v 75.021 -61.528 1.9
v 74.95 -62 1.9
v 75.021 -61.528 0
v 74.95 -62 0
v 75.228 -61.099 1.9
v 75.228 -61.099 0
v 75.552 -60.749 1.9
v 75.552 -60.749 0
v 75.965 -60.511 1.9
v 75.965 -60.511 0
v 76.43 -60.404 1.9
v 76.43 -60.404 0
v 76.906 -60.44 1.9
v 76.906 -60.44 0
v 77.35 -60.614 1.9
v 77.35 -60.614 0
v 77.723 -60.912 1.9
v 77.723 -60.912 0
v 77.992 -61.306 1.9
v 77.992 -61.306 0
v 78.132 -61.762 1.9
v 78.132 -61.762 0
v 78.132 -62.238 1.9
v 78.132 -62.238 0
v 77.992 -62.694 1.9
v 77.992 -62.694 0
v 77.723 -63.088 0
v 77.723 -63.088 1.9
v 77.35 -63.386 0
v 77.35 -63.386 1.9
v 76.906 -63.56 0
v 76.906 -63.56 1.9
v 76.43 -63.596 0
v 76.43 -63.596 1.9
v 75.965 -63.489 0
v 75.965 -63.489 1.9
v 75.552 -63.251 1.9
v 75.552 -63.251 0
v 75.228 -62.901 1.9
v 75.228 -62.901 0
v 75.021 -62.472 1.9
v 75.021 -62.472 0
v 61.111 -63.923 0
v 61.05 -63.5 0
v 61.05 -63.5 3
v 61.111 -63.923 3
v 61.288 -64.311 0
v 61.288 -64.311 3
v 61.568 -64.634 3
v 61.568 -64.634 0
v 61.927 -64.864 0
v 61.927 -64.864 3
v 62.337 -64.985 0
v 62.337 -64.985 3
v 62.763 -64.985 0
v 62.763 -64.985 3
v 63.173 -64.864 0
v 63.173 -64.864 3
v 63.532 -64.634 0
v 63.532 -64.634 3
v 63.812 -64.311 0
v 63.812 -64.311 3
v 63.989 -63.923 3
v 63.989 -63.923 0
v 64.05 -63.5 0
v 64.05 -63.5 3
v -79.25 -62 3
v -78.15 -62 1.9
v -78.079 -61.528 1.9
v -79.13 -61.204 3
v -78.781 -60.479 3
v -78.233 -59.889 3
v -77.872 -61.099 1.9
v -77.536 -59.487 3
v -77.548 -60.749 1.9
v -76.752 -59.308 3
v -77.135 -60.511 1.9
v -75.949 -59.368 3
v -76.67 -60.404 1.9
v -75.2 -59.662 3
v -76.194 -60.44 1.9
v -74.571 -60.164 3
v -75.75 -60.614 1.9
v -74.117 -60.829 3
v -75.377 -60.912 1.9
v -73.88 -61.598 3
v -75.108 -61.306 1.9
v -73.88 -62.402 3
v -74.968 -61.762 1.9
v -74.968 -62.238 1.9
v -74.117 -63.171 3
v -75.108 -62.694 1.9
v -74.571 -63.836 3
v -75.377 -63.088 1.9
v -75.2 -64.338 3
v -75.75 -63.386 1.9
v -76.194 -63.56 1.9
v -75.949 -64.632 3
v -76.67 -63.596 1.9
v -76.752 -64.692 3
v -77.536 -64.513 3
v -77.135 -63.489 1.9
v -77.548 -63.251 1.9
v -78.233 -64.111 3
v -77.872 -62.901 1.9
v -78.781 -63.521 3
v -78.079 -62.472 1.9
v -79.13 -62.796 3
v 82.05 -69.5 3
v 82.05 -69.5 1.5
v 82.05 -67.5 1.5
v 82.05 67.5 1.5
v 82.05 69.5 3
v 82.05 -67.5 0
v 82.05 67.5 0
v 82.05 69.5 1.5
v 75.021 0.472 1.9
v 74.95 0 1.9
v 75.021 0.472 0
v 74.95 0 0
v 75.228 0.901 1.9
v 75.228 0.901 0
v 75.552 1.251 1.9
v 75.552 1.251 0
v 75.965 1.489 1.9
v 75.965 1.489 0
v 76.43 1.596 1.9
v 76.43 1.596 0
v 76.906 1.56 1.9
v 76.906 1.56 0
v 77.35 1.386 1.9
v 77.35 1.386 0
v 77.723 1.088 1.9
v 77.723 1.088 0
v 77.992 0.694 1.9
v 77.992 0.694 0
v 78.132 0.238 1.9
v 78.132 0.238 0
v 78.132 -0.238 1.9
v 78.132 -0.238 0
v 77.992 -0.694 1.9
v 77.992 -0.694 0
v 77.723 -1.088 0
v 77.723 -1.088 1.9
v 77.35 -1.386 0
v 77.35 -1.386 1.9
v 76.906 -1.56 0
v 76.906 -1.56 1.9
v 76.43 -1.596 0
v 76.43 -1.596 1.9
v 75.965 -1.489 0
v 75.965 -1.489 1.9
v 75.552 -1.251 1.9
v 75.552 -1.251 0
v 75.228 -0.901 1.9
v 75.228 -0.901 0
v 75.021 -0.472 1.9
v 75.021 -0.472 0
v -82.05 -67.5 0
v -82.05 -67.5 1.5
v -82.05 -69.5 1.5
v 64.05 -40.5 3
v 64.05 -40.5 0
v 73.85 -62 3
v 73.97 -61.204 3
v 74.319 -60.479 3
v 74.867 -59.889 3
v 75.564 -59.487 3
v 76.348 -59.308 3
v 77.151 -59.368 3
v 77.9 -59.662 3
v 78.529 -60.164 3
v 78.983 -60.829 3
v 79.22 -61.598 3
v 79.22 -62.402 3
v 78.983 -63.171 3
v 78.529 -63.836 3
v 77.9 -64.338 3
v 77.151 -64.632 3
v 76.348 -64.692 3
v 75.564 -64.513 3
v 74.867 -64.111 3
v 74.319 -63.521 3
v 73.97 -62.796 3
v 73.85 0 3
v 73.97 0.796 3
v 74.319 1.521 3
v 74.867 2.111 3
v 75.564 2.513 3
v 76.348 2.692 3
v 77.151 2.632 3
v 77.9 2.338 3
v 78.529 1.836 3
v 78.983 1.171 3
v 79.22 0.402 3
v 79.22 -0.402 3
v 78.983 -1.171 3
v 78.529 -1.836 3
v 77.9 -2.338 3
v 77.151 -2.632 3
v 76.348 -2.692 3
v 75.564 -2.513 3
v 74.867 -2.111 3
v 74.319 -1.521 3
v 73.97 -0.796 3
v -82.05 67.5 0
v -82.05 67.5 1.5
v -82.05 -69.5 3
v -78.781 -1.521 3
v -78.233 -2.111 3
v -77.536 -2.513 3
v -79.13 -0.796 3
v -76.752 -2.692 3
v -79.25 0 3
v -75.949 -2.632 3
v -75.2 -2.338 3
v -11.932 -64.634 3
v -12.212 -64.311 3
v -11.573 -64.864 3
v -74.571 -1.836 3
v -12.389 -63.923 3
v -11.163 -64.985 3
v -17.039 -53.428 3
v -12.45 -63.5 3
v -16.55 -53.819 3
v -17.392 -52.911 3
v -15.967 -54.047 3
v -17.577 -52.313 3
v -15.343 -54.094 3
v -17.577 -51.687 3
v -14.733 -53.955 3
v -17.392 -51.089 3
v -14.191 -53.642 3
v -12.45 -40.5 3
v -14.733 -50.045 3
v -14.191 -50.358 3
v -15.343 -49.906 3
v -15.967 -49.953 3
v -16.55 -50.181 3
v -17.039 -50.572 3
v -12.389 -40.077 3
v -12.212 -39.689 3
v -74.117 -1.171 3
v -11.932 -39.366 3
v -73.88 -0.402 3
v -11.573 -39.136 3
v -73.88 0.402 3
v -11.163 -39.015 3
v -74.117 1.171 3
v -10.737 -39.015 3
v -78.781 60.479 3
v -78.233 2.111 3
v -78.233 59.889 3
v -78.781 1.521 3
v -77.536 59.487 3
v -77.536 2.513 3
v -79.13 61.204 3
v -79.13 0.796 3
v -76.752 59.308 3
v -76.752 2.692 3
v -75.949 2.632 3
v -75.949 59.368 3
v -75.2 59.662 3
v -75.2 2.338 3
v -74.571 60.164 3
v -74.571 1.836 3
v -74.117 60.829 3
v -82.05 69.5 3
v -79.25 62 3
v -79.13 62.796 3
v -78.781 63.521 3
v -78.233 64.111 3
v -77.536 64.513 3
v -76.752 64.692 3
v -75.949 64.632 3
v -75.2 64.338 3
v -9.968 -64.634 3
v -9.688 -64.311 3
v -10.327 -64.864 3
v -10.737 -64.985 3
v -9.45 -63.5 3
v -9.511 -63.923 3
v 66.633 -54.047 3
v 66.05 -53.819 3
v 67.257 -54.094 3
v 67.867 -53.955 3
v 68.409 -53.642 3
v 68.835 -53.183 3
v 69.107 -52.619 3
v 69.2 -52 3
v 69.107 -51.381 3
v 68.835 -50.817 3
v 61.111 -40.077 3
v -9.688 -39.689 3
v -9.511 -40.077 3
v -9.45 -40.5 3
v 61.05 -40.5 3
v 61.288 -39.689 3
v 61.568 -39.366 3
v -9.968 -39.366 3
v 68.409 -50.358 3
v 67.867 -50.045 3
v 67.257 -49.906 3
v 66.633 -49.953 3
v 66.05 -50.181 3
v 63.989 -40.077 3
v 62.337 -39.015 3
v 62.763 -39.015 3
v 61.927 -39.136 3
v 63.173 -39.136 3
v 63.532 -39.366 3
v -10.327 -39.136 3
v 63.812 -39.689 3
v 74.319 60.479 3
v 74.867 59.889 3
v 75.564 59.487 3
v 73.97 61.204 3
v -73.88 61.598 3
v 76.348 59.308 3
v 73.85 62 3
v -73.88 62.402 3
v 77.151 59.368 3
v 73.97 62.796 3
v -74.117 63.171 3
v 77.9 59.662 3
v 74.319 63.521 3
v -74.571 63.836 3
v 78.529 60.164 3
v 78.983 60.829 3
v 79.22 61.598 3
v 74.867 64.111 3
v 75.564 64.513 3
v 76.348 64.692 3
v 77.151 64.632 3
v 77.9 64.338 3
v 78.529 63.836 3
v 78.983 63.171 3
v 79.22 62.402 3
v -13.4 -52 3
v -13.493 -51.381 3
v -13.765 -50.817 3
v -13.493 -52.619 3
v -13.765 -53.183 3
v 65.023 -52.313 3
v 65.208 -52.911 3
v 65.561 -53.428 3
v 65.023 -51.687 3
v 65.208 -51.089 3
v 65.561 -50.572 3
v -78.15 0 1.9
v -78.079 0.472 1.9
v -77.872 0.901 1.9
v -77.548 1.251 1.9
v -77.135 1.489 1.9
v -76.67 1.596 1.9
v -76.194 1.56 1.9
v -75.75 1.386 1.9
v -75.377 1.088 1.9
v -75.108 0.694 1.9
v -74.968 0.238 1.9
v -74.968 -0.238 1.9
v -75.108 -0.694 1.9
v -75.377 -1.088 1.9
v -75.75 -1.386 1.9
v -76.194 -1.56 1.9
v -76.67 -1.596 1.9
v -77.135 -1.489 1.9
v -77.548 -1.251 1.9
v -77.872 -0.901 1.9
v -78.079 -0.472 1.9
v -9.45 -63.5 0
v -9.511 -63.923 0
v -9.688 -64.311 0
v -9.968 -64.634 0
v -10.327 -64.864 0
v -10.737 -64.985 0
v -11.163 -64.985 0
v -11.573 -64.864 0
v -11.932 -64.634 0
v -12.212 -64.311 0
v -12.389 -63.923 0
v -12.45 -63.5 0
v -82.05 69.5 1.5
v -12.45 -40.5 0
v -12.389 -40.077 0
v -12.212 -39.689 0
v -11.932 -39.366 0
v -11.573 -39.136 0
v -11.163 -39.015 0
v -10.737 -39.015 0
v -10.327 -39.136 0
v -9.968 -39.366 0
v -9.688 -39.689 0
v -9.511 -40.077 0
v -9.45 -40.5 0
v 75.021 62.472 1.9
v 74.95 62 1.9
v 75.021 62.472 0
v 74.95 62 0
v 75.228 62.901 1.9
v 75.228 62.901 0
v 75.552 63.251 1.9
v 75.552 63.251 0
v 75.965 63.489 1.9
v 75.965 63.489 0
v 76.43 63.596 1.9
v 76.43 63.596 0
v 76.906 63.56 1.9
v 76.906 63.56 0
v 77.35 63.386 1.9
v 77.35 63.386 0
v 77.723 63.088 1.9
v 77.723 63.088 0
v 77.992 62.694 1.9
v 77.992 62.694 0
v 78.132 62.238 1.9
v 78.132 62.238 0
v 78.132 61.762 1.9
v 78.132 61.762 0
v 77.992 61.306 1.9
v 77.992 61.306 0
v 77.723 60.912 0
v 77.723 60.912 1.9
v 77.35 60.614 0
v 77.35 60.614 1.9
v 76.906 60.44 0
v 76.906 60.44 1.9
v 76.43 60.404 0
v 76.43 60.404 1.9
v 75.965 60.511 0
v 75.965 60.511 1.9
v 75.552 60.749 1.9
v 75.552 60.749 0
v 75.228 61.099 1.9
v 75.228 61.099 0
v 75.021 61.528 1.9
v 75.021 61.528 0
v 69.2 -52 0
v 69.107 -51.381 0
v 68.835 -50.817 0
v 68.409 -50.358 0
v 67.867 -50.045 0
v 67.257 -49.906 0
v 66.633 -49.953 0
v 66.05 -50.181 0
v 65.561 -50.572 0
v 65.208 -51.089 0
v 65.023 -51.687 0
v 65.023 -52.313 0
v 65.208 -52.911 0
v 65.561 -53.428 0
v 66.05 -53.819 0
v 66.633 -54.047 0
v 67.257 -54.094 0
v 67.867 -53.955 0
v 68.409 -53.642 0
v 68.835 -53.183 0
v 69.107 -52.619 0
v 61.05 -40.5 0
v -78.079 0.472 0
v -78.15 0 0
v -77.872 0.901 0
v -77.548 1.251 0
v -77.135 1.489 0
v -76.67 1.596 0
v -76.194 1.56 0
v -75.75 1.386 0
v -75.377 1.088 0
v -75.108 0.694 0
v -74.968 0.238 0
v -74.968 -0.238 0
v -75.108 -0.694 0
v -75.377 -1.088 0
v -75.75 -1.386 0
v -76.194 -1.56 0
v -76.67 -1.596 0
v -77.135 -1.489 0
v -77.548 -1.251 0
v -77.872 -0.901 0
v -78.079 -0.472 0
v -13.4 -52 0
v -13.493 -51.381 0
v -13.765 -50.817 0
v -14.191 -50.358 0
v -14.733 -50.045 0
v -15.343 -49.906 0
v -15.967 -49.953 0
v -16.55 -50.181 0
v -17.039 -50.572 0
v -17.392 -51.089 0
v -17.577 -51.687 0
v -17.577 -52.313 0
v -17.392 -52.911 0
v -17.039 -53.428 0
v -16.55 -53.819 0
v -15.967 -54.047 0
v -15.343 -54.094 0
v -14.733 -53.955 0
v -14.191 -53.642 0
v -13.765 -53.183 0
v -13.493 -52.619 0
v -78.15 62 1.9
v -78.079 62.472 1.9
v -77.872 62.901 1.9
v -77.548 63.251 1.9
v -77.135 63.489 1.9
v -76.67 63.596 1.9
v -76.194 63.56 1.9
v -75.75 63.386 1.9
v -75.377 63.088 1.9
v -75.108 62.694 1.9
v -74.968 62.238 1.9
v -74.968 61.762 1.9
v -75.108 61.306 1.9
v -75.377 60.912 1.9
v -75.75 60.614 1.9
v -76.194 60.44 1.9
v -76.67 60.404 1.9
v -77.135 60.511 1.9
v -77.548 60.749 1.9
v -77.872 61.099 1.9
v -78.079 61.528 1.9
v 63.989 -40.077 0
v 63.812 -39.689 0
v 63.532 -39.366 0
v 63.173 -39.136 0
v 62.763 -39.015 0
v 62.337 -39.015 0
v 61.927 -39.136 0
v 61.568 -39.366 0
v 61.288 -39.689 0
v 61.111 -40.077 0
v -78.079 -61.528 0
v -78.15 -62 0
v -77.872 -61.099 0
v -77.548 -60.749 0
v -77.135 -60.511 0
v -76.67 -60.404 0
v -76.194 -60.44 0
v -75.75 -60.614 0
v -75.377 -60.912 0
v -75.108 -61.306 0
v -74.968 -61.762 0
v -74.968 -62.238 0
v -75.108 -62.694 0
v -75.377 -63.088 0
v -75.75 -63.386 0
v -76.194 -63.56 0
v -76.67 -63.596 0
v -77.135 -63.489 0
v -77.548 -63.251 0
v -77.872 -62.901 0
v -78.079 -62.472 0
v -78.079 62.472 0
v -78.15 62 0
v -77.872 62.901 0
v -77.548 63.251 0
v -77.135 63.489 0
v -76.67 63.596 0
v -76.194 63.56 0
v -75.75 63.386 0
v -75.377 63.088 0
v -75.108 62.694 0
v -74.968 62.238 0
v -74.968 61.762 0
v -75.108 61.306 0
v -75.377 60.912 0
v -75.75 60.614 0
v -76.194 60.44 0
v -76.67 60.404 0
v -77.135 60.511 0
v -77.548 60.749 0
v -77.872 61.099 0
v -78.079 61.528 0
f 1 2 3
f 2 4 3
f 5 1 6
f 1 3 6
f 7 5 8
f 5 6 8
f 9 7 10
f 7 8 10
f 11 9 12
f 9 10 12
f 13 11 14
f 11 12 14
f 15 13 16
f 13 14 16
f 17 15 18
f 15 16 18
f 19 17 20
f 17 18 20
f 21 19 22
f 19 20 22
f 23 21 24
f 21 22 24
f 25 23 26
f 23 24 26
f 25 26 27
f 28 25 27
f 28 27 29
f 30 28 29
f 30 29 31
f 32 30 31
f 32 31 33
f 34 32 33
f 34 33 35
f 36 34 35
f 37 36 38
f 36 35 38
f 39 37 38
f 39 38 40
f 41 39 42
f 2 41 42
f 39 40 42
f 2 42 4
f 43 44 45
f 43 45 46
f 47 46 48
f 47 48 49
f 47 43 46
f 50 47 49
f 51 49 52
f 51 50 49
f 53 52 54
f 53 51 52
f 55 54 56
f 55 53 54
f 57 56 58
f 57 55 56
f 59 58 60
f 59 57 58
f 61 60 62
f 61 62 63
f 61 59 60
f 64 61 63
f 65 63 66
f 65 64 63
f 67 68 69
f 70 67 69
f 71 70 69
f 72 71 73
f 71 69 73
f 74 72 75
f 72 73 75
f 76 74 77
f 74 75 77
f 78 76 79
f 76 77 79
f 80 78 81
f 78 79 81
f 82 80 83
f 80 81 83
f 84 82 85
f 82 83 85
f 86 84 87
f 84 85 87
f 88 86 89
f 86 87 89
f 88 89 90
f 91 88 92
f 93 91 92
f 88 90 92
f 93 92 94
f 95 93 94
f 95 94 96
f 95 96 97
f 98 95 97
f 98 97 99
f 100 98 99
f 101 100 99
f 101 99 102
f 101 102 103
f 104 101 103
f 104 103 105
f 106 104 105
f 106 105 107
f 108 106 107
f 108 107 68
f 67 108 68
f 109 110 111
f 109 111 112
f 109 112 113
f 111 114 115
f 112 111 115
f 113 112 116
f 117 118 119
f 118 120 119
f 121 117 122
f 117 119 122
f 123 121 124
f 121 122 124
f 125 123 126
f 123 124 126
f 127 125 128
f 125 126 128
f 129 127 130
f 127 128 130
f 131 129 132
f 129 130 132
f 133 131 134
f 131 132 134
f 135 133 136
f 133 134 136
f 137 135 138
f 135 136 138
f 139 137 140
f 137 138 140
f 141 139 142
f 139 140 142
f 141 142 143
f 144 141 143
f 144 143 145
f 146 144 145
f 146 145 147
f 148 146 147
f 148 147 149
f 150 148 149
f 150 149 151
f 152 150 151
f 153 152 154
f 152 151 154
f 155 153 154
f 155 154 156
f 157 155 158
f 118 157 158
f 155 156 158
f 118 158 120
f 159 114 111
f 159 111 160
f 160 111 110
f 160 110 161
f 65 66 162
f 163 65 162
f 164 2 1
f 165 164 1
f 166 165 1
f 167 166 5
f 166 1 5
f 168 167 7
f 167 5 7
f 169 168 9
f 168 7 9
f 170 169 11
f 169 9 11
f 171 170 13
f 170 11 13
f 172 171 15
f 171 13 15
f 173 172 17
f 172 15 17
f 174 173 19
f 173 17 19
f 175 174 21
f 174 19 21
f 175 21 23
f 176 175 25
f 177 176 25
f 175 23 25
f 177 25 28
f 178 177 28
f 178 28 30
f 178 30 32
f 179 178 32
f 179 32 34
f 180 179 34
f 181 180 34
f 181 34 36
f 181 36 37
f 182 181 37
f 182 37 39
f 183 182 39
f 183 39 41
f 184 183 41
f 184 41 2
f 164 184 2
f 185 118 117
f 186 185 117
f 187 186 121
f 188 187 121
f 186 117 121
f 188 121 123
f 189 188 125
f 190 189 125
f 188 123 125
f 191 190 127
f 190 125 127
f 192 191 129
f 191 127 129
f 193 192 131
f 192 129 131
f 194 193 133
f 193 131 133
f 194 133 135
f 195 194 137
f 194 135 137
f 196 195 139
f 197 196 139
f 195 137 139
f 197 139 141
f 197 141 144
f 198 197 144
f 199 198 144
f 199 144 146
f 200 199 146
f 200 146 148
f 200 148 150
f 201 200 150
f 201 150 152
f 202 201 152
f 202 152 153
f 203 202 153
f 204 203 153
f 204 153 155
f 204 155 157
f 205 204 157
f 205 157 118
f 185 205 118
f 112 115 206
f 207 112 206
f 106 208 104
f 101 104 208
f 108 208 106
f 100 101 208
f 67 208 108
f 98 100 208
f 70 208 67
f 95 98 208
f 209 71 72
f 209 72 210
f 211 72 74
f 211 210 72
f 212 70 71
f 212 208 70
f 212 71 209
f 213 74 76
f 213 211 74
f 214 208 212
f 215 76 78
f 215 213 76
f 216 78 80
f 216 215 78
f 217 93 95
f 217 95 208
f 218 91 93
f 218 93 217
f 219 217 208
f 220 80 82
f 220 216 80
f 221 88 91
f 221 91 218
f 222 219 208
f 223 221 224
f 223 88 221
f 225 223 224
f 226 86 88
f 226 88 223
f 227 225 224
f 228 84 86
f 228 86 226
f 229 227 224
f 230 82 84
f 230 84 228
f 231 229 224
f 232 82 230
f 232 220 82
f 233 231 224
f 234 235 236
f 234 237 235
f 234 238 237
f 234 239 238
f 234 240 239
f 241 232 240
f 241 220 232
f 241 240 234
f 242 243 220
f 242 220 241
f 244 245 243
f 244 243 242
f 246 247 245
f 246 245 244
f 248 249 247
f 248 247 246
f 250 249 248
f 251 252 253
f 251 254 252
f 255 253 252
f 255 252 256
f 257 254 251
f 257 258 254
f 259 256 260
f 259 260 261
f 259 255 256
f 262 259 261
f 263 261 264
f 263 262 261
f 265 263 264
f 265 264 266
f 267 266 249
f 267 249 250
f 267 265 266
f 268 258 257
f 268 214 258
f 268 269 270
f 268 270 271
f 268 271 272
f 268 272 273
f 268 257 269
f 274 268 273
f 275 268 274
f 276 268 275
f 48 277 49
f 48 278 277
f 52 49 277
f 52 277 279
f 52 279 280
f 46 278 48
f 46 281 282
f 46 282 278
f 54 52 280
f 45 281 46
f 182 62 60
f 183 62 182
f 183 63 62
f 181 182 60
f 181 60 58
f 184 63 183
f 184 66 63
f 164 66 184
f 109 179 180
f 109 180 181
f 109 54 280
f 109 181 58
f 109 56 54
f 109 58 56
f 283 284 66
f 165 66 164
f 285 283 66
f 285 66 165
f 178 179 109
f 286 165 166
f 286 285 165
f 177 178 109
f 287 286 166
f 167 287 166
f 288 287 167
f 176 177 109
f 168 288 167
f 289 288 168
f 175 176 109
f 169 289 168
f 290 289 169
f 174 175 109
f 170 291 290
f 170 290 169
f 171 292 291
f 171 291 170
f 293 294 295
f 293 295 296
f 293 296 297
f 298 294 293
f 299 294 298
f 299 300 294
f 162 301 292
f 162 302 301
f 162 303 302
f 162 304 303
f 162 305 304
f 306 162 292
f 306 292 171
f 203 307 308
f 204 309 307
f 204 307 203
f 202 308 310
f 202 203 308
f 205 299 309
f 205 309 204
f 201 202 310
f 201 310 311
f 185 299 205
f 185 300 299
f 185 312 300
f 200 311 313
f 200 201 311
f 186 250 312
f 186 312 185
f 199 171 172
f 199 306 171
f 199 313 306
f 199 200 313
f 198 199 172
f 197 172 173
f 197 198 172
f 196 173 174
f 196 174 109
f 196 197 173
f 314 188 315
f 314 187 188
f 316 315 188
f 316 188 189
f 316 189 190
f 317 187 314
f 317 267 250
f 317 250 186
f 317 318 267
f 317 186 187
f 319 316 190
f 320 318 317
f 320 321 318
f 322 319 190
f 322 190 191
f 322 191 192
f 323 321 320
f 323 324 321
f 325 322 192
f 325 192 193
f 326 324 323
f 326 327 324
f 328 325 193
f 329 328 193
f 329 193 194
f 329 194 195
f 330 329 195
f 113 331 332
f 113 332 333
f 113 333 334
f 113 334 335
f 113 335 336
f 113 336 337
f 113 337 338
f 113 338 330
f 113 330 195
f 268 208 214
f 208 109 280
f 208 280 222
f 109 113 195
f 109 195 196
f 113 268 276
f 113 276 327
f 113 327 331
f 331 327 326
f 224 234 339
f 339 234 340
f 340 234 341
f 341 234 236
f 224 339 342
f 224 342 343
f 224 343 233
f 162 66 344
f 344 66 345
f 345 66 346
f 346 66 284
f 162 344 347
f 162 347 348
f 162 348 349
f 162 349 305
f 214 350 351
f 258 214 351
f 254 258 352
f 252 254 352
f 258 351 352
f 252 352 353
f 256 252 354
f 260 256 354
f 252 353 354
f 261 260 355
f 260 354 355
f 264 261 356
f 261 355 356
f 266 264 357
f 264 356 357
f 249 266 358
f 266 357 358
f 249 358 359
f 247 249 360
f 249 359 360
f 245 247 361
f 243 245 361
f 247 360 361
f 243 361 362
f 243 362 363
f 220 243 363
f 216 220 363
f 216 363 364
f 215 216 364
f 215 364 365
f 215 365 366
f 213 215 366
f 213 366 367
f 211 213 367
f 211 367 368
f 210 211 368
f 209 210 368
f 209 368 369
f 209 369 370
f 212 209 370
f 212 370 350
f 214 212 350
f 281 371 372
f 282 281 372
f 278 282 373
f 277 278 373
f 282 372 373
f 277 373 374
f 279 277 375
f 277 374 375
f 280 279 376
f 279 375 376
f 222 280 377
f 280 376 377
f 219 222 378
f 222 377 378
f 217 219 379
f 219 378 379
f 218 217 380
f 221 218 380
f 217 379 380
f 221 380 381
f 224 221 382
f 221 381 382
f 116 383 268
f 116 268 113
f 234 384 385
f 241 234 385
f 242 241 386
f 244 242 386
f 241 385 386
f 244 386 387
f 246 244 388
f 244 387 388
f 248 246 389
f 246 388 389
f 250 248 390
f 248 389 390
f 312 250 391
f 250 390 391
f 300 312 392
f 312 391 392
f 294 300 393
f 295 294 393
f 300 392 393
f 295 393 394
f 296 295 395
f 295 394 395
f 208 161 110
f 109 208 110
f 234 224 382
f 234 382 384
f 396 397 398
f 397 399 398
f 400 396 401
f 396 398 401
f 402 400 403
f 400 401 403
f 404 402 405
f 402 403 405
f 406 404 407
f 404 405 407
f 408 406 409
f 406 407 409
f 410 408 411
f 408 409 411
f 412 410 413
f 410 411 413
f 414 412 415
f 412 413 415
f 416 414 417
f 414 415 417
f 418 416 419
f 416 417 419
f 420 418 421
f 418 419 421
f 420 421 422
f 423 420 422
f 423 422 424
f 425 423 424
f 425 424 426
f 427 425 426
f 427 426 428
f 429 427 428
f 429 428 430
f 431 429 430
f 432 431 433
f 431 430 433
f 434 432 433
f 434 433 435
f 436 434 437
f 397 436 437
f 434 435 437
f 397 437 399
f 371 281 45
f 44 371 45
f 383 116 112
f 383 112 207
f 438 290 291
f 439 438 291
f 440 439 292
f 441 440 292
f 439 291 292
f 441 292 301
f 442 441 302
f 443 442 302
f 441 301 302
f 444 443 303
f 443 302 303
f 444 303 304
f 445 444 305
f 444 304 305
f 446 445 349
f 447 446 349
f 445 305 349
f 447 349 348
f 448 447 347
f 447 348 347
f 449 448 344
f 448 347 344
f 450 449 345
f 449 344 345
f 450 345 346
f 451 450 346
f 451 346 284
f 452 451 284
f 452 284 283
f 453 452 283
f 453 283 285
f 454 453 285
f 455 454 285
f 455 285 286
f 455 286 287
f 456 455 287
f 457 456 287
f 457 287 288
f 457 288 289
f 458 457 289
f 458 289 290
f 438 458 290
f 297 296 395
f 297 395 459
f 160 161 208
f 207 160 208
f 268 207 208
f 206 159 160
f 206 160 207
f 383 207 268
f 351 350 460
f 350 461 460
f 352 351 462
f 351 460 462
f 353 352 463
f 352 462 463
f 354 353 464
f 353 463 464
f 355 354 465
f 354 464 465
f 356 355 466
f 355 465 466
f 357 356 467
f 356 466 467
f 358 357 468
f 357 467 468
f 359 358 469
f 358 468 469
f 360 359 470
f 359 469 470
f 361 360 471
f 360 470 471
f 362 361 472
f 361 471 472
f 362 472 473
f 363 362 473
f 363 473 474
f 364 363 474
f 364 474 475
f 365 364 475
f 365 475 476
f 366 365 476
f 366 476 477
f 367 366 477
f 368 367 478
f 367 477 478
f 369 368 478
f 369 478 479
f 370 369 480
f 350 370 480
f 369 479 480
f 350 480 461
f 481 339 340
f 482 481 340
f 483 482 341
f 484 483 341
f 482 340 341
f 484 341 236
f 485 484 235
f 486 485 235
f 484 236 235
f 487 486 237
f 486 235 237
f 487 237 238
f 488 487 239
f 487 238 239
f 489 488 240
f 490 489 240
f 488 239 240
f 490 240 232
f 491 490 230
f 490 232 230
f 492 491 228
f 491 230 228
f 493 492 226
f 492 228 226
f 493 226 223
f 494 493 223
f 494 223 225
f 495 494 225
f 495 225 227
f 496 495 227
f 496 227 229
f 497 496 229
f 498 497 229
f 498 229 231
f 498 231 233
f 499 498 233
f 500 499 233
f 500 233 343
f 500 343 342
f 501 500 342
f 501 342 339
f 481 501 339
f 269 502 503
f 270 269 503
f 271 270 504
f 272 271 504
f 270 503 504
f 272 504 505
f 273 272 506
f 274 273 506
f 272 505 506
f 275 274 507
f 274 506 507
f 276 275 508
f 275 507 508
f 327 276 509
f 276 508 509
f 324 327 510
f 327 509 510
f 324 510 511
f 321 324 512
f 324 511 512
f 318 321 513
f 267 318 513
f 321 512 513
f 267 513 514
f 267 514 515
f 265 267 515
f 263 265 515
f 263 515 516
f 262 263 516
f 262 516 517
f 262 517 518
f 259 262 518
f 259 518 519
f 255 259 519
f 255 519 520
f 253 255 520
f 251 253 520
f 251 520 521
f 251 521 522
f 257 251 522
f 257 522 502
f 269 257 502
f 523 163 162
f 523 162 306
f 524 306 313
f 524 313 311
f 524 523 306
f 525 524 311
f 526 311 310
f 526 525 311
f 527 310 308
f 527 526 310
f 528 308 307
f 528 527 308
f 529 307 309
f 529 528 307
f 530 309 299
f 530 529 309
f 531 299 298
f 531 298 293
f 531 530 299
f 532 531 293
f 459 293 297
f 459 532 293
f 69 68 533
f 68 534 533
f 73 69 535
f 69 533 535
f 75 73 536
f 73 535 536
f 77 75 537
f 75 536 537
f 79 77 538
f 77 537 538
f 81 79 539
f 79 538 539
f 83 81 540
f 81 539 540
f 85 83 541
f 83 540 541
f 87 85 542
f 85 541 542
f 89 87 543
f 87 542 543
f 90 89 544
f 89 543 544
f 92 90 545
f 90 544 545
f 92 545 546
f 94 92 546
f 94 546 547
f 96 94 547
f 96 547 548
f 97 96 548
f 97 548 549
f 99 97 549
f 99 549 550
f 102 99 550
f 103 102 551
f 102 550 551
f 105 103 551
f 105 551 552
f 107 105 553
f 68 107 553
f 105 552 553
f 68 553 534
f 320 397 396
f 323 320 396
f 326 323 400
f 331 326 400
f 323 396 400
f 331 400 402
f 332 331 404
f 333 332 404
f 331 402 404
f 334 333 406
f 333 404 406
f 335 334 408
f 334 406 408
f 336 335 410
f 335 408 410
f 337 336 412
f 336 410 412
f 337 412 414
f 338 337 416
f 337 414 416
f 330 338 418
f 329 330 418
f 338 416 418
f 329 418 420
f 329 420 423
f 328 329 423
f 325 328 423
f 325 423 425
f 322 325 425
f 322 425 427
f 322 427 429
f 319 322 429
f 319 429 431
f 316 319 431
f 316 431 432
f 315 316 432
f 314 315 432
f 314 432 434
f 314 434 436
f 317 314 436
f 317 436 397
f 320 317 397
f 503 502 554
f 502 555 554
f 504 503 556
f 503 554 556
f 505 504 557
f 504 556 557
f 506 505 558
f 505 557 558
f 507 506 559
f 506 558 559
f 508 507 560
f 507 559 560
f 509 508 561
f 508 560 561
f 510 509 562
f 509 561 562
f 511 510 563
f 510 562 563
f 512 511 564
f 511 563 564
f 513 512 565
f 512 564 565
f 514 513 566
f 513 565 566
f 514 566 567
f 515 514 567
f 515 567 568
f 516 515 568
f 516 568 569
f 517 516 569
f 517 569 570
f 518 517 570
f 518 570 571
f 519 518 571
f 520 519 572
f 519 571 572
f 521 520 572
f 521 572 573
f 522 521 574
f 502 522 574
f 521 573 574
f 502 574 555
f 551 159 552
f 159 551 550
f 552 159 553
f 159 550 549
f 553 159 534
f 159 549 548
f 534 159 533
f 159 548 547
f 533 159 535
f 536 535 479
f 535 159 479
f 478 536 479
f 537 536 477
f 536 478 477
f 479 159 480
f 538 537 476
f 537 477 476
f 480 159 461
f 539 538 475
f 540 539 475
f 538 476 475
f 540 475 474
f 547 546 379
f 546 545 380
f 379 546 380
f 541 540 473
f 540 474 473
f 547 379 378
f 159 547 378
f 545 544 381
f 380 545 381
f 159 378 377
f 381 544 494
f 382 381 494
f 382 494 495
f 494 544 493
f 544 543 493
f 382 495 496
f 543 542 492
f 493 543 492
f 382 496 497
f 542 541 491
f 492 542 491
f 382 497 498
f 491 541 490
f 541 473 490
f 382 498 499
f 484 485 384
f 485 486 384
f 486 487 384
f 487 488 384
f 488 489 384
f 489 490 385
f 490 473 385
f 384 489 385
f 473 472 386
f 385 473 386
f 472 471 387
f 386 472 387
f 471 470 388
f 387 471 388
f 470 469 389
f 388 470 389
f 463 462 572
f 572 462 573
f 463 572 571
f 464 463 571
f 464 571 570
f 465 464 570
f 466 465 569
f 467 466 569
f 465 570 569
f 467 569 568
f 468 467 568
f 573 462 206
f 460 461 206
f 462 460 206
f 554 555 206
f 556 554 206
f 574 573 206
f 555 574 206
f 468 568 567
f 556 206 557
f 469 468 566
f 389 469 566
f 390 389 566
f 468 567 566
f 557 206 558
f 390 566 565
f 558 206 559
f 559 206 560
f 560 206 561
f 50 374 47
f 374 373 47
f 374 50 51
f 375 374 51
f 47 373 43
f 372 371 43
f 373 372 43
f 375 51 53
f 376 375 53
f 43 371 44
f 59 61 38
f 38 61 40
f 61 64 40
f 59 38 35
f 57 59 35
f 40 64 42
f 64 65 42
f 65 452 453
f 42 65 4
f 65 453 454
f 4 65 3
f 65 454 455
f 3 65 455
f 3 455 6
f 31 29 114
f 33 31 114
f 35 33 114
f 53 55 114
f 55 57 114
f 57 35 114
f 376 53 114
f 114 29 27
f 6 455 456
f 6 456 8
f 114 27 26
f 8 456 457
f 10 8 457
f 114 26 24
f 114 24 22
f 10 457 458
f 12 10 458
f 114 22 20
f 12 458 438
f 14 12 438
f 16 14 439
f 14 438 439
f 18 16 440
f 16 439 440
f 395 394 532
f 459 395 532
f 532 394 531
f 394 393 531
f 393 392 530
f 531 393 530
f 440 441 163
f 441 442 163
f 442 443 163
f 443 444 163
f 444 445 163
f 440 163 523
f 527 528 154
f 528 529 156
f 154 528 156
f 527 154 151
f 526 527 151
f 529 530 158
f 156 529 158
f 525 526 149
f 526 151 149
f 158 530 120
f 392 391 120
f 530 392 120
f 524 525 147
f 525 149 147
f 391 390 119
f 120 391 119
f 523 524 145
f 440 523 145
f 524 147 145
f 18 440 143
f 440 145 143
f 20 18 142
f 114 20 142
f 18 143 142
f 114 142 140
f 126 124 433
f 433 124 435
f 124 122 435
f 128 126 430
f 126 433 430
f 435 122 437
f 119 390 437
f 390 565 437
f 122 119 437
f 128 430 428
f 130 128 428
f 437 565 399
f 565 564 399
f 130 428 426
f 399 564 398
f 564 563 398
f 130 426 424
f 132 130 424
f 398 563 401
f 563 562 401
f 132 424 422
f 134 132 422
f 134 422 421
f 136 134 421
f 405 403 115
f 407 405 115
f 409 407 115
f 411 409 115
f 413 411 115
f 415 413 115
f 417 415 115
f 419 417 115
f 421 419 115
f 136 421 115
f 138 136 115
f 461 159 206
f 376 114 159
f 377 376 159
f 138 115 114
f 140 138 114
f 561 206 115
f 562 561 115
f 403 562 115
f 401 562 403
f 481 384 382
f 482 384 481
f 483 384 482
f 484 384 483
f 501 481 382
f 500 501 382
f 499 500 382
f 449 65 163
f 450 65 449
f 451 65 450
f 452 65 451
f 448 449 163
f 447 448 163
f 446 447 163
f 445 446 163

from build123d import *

# Parameters (mm, degrees)
SKETCH1_W                                         = 164.1
SKETCH1_H                                         = 139
BOSS_EXTRUDE1_DEPTH                               = 3
CSK_FOR_4_FLAT_HEAD_MACHINE_SCREW_100_D           = 3.19999995
CSK_FOR_4_FLAT_HEAD_MACHINE_SCREW_100_CSINK_D     = 5.400000122
CSK_FOR_4_FLAT_HEAD_MACHINE_SCREW_100_CSINK_ANGLE = 90
CUT_EXTRUDE1_REACH                                = 109.571
SKETCH4_R                                         = 2.1
SKETCH4_W                                         = 76.5
SKETCH4_H                                         = 23
CUT_EXTRUDE2_START                                = -3
CUT_EXTRUDE2_DEPTH                                = 3
SKETCH6_W                                         = 164.1
SKETCH6_H                                         = 2
CUT_EXTRUDE3_DEPTH                                = 1.5


with BuildPart() as part:
    # Sketch1 → Boss-Extrude1 (new body)
    with BuildSketch(Plane.XY):
        Rectangle(SKETCH1_W, SKETCH1_H)
    extrude(amount=BOSS_EXTRUDE1_DEPTH)

    # CSK for #4 Flat Head Machine Screw (100)1 (through all)
    with Locations(Plane.XY.offset(3)):
        with Locations((-76.55, 62), (-76.55, 0), (-76.55, -62), (76.55, -62), (76.55, 0), (76.55, 62)):
            CounterSinkHole(CSK_FOR_4_FLAT_HEAD_MACHINE_SCREW_100_D / 2, CSK_FOR_4_FLAT_HEAD_MACHINE_SCREW_100_CSINK_D / 2, counter_sink_angle=CSK_FOR_4_FLAT_HEAD_MACHINE_SCREW_100_CSINK_ANGLE)

    # Sketch4 → Cut-Extrude1 (cut, up to next)
    with BuildSketch(Plane.XY.offset(3), mode=Mode.PRIVATE) as cut_extrude1_sk1:
        with Locations((-15.5, -52)):
            Circle(SKETCH4_R)
    cut_extrude1_tool1 = extrude(cut_extrude1_sk1.sketch, amount=-CUT_EXTRUDE1_REACH, mode=Mode.PRIVATE) & part.part
    # Sketch4 → Cut-Extrude1 (cut, up to next)
    with BuildSketch(Plane.XY.offset(3), mode=Mode.PRIVATE) as cut_extrude1_sk2:
        with Locations((67.1, -52)):
            Circle(SKETCH4_R)
    cut_extrude1_tool2 = extrude(cut_extrude1_sk2.sketch, amount=-CUT_EXTRUDE1_REACH, mode=Mode.PRIVATE) & part.part
    # Sketch4 → Cut-Extrude1 (cut, up to next)
    with BuildSketch(Plane.XY.offset(3), mode=Mode.PRIVATE) as cut_extrude1_sk3:
        with Locations((25.8, -52)):
            Rectangle(SKETCH4_W, SKETCH4_H)
    cut_extrude1_tool3 = extrude(cut_extrude1_sk3.sketch, amount=-CUT_EXTRUDE1_REACH, mode=Mode.PRIVATE) & part.part
    add(cut_extrude1_tool1.solids().sort_by_distance((-15.5, -52, 3))[0], mode=Mode.SUBTRACT)
    add(cut_extrude1_tool2.solids().sort_by_distance((67.1, -52, 3))[0], mode=Mode.SUBTRACT)
    add(cut_extrude1_tool3.solids().sort_by_distance((25.8, -52, 3))[0], mode=Mode.SUBTRACT)

    # Sketch5 → Cut-Extrude2 (cut)
    with BuildSketch(Plane.XY.offset(3).offset(CUT_EXTRUDE2_START)):
        with BuildLine():
            Line((-12.45, -63.5), (-12.45, -40.5))
            ThreePointArc((-12.45, -40.5), (-10.95, -39), (-9.45, -40.5))
            Line((-9.45, -40.5), (-9.45, -63.5))
            ThreePointArc((-9.45, -63.5), (-10.95, -65), (-12.45, -63.5))
        make_face()
        with BuildLine():
            Line((64.05, -63.5), (64.05, -40.5))
            ThreePointArc((64.05, -40.5), (62.55, -39), (61.05, -40.5))
            Line((61.05, -40.5), (61.05, -63.5))
            ThreePointArc((61.05, -63.5), (62.55, -65), (64.05, -63.5))
        make_face()
    extrude(amount=CUT_EXTRUDE2_DEPTH, mode=Mode.SUBTRACT)

    # Sketch6 → Cut-Extrude3 (cut)
    with BuildSketch(Plane(origin=(0, 0, 0), x_dir=(-1, 0, 0), z_dir=(0, 0, -1))):
        with Locations((0, 68.5)):
            Rectangle(SKETCH6_W, SKETCH6_H)
        with Locations((0, -68.5)):
            Rectangle(SKETCH6_W, SKETCH6_H)
    extrude(amount=-CUT_EXTRUDE3_DEPTH, mode=Mode.SUBTRACT)


solid = part.part
